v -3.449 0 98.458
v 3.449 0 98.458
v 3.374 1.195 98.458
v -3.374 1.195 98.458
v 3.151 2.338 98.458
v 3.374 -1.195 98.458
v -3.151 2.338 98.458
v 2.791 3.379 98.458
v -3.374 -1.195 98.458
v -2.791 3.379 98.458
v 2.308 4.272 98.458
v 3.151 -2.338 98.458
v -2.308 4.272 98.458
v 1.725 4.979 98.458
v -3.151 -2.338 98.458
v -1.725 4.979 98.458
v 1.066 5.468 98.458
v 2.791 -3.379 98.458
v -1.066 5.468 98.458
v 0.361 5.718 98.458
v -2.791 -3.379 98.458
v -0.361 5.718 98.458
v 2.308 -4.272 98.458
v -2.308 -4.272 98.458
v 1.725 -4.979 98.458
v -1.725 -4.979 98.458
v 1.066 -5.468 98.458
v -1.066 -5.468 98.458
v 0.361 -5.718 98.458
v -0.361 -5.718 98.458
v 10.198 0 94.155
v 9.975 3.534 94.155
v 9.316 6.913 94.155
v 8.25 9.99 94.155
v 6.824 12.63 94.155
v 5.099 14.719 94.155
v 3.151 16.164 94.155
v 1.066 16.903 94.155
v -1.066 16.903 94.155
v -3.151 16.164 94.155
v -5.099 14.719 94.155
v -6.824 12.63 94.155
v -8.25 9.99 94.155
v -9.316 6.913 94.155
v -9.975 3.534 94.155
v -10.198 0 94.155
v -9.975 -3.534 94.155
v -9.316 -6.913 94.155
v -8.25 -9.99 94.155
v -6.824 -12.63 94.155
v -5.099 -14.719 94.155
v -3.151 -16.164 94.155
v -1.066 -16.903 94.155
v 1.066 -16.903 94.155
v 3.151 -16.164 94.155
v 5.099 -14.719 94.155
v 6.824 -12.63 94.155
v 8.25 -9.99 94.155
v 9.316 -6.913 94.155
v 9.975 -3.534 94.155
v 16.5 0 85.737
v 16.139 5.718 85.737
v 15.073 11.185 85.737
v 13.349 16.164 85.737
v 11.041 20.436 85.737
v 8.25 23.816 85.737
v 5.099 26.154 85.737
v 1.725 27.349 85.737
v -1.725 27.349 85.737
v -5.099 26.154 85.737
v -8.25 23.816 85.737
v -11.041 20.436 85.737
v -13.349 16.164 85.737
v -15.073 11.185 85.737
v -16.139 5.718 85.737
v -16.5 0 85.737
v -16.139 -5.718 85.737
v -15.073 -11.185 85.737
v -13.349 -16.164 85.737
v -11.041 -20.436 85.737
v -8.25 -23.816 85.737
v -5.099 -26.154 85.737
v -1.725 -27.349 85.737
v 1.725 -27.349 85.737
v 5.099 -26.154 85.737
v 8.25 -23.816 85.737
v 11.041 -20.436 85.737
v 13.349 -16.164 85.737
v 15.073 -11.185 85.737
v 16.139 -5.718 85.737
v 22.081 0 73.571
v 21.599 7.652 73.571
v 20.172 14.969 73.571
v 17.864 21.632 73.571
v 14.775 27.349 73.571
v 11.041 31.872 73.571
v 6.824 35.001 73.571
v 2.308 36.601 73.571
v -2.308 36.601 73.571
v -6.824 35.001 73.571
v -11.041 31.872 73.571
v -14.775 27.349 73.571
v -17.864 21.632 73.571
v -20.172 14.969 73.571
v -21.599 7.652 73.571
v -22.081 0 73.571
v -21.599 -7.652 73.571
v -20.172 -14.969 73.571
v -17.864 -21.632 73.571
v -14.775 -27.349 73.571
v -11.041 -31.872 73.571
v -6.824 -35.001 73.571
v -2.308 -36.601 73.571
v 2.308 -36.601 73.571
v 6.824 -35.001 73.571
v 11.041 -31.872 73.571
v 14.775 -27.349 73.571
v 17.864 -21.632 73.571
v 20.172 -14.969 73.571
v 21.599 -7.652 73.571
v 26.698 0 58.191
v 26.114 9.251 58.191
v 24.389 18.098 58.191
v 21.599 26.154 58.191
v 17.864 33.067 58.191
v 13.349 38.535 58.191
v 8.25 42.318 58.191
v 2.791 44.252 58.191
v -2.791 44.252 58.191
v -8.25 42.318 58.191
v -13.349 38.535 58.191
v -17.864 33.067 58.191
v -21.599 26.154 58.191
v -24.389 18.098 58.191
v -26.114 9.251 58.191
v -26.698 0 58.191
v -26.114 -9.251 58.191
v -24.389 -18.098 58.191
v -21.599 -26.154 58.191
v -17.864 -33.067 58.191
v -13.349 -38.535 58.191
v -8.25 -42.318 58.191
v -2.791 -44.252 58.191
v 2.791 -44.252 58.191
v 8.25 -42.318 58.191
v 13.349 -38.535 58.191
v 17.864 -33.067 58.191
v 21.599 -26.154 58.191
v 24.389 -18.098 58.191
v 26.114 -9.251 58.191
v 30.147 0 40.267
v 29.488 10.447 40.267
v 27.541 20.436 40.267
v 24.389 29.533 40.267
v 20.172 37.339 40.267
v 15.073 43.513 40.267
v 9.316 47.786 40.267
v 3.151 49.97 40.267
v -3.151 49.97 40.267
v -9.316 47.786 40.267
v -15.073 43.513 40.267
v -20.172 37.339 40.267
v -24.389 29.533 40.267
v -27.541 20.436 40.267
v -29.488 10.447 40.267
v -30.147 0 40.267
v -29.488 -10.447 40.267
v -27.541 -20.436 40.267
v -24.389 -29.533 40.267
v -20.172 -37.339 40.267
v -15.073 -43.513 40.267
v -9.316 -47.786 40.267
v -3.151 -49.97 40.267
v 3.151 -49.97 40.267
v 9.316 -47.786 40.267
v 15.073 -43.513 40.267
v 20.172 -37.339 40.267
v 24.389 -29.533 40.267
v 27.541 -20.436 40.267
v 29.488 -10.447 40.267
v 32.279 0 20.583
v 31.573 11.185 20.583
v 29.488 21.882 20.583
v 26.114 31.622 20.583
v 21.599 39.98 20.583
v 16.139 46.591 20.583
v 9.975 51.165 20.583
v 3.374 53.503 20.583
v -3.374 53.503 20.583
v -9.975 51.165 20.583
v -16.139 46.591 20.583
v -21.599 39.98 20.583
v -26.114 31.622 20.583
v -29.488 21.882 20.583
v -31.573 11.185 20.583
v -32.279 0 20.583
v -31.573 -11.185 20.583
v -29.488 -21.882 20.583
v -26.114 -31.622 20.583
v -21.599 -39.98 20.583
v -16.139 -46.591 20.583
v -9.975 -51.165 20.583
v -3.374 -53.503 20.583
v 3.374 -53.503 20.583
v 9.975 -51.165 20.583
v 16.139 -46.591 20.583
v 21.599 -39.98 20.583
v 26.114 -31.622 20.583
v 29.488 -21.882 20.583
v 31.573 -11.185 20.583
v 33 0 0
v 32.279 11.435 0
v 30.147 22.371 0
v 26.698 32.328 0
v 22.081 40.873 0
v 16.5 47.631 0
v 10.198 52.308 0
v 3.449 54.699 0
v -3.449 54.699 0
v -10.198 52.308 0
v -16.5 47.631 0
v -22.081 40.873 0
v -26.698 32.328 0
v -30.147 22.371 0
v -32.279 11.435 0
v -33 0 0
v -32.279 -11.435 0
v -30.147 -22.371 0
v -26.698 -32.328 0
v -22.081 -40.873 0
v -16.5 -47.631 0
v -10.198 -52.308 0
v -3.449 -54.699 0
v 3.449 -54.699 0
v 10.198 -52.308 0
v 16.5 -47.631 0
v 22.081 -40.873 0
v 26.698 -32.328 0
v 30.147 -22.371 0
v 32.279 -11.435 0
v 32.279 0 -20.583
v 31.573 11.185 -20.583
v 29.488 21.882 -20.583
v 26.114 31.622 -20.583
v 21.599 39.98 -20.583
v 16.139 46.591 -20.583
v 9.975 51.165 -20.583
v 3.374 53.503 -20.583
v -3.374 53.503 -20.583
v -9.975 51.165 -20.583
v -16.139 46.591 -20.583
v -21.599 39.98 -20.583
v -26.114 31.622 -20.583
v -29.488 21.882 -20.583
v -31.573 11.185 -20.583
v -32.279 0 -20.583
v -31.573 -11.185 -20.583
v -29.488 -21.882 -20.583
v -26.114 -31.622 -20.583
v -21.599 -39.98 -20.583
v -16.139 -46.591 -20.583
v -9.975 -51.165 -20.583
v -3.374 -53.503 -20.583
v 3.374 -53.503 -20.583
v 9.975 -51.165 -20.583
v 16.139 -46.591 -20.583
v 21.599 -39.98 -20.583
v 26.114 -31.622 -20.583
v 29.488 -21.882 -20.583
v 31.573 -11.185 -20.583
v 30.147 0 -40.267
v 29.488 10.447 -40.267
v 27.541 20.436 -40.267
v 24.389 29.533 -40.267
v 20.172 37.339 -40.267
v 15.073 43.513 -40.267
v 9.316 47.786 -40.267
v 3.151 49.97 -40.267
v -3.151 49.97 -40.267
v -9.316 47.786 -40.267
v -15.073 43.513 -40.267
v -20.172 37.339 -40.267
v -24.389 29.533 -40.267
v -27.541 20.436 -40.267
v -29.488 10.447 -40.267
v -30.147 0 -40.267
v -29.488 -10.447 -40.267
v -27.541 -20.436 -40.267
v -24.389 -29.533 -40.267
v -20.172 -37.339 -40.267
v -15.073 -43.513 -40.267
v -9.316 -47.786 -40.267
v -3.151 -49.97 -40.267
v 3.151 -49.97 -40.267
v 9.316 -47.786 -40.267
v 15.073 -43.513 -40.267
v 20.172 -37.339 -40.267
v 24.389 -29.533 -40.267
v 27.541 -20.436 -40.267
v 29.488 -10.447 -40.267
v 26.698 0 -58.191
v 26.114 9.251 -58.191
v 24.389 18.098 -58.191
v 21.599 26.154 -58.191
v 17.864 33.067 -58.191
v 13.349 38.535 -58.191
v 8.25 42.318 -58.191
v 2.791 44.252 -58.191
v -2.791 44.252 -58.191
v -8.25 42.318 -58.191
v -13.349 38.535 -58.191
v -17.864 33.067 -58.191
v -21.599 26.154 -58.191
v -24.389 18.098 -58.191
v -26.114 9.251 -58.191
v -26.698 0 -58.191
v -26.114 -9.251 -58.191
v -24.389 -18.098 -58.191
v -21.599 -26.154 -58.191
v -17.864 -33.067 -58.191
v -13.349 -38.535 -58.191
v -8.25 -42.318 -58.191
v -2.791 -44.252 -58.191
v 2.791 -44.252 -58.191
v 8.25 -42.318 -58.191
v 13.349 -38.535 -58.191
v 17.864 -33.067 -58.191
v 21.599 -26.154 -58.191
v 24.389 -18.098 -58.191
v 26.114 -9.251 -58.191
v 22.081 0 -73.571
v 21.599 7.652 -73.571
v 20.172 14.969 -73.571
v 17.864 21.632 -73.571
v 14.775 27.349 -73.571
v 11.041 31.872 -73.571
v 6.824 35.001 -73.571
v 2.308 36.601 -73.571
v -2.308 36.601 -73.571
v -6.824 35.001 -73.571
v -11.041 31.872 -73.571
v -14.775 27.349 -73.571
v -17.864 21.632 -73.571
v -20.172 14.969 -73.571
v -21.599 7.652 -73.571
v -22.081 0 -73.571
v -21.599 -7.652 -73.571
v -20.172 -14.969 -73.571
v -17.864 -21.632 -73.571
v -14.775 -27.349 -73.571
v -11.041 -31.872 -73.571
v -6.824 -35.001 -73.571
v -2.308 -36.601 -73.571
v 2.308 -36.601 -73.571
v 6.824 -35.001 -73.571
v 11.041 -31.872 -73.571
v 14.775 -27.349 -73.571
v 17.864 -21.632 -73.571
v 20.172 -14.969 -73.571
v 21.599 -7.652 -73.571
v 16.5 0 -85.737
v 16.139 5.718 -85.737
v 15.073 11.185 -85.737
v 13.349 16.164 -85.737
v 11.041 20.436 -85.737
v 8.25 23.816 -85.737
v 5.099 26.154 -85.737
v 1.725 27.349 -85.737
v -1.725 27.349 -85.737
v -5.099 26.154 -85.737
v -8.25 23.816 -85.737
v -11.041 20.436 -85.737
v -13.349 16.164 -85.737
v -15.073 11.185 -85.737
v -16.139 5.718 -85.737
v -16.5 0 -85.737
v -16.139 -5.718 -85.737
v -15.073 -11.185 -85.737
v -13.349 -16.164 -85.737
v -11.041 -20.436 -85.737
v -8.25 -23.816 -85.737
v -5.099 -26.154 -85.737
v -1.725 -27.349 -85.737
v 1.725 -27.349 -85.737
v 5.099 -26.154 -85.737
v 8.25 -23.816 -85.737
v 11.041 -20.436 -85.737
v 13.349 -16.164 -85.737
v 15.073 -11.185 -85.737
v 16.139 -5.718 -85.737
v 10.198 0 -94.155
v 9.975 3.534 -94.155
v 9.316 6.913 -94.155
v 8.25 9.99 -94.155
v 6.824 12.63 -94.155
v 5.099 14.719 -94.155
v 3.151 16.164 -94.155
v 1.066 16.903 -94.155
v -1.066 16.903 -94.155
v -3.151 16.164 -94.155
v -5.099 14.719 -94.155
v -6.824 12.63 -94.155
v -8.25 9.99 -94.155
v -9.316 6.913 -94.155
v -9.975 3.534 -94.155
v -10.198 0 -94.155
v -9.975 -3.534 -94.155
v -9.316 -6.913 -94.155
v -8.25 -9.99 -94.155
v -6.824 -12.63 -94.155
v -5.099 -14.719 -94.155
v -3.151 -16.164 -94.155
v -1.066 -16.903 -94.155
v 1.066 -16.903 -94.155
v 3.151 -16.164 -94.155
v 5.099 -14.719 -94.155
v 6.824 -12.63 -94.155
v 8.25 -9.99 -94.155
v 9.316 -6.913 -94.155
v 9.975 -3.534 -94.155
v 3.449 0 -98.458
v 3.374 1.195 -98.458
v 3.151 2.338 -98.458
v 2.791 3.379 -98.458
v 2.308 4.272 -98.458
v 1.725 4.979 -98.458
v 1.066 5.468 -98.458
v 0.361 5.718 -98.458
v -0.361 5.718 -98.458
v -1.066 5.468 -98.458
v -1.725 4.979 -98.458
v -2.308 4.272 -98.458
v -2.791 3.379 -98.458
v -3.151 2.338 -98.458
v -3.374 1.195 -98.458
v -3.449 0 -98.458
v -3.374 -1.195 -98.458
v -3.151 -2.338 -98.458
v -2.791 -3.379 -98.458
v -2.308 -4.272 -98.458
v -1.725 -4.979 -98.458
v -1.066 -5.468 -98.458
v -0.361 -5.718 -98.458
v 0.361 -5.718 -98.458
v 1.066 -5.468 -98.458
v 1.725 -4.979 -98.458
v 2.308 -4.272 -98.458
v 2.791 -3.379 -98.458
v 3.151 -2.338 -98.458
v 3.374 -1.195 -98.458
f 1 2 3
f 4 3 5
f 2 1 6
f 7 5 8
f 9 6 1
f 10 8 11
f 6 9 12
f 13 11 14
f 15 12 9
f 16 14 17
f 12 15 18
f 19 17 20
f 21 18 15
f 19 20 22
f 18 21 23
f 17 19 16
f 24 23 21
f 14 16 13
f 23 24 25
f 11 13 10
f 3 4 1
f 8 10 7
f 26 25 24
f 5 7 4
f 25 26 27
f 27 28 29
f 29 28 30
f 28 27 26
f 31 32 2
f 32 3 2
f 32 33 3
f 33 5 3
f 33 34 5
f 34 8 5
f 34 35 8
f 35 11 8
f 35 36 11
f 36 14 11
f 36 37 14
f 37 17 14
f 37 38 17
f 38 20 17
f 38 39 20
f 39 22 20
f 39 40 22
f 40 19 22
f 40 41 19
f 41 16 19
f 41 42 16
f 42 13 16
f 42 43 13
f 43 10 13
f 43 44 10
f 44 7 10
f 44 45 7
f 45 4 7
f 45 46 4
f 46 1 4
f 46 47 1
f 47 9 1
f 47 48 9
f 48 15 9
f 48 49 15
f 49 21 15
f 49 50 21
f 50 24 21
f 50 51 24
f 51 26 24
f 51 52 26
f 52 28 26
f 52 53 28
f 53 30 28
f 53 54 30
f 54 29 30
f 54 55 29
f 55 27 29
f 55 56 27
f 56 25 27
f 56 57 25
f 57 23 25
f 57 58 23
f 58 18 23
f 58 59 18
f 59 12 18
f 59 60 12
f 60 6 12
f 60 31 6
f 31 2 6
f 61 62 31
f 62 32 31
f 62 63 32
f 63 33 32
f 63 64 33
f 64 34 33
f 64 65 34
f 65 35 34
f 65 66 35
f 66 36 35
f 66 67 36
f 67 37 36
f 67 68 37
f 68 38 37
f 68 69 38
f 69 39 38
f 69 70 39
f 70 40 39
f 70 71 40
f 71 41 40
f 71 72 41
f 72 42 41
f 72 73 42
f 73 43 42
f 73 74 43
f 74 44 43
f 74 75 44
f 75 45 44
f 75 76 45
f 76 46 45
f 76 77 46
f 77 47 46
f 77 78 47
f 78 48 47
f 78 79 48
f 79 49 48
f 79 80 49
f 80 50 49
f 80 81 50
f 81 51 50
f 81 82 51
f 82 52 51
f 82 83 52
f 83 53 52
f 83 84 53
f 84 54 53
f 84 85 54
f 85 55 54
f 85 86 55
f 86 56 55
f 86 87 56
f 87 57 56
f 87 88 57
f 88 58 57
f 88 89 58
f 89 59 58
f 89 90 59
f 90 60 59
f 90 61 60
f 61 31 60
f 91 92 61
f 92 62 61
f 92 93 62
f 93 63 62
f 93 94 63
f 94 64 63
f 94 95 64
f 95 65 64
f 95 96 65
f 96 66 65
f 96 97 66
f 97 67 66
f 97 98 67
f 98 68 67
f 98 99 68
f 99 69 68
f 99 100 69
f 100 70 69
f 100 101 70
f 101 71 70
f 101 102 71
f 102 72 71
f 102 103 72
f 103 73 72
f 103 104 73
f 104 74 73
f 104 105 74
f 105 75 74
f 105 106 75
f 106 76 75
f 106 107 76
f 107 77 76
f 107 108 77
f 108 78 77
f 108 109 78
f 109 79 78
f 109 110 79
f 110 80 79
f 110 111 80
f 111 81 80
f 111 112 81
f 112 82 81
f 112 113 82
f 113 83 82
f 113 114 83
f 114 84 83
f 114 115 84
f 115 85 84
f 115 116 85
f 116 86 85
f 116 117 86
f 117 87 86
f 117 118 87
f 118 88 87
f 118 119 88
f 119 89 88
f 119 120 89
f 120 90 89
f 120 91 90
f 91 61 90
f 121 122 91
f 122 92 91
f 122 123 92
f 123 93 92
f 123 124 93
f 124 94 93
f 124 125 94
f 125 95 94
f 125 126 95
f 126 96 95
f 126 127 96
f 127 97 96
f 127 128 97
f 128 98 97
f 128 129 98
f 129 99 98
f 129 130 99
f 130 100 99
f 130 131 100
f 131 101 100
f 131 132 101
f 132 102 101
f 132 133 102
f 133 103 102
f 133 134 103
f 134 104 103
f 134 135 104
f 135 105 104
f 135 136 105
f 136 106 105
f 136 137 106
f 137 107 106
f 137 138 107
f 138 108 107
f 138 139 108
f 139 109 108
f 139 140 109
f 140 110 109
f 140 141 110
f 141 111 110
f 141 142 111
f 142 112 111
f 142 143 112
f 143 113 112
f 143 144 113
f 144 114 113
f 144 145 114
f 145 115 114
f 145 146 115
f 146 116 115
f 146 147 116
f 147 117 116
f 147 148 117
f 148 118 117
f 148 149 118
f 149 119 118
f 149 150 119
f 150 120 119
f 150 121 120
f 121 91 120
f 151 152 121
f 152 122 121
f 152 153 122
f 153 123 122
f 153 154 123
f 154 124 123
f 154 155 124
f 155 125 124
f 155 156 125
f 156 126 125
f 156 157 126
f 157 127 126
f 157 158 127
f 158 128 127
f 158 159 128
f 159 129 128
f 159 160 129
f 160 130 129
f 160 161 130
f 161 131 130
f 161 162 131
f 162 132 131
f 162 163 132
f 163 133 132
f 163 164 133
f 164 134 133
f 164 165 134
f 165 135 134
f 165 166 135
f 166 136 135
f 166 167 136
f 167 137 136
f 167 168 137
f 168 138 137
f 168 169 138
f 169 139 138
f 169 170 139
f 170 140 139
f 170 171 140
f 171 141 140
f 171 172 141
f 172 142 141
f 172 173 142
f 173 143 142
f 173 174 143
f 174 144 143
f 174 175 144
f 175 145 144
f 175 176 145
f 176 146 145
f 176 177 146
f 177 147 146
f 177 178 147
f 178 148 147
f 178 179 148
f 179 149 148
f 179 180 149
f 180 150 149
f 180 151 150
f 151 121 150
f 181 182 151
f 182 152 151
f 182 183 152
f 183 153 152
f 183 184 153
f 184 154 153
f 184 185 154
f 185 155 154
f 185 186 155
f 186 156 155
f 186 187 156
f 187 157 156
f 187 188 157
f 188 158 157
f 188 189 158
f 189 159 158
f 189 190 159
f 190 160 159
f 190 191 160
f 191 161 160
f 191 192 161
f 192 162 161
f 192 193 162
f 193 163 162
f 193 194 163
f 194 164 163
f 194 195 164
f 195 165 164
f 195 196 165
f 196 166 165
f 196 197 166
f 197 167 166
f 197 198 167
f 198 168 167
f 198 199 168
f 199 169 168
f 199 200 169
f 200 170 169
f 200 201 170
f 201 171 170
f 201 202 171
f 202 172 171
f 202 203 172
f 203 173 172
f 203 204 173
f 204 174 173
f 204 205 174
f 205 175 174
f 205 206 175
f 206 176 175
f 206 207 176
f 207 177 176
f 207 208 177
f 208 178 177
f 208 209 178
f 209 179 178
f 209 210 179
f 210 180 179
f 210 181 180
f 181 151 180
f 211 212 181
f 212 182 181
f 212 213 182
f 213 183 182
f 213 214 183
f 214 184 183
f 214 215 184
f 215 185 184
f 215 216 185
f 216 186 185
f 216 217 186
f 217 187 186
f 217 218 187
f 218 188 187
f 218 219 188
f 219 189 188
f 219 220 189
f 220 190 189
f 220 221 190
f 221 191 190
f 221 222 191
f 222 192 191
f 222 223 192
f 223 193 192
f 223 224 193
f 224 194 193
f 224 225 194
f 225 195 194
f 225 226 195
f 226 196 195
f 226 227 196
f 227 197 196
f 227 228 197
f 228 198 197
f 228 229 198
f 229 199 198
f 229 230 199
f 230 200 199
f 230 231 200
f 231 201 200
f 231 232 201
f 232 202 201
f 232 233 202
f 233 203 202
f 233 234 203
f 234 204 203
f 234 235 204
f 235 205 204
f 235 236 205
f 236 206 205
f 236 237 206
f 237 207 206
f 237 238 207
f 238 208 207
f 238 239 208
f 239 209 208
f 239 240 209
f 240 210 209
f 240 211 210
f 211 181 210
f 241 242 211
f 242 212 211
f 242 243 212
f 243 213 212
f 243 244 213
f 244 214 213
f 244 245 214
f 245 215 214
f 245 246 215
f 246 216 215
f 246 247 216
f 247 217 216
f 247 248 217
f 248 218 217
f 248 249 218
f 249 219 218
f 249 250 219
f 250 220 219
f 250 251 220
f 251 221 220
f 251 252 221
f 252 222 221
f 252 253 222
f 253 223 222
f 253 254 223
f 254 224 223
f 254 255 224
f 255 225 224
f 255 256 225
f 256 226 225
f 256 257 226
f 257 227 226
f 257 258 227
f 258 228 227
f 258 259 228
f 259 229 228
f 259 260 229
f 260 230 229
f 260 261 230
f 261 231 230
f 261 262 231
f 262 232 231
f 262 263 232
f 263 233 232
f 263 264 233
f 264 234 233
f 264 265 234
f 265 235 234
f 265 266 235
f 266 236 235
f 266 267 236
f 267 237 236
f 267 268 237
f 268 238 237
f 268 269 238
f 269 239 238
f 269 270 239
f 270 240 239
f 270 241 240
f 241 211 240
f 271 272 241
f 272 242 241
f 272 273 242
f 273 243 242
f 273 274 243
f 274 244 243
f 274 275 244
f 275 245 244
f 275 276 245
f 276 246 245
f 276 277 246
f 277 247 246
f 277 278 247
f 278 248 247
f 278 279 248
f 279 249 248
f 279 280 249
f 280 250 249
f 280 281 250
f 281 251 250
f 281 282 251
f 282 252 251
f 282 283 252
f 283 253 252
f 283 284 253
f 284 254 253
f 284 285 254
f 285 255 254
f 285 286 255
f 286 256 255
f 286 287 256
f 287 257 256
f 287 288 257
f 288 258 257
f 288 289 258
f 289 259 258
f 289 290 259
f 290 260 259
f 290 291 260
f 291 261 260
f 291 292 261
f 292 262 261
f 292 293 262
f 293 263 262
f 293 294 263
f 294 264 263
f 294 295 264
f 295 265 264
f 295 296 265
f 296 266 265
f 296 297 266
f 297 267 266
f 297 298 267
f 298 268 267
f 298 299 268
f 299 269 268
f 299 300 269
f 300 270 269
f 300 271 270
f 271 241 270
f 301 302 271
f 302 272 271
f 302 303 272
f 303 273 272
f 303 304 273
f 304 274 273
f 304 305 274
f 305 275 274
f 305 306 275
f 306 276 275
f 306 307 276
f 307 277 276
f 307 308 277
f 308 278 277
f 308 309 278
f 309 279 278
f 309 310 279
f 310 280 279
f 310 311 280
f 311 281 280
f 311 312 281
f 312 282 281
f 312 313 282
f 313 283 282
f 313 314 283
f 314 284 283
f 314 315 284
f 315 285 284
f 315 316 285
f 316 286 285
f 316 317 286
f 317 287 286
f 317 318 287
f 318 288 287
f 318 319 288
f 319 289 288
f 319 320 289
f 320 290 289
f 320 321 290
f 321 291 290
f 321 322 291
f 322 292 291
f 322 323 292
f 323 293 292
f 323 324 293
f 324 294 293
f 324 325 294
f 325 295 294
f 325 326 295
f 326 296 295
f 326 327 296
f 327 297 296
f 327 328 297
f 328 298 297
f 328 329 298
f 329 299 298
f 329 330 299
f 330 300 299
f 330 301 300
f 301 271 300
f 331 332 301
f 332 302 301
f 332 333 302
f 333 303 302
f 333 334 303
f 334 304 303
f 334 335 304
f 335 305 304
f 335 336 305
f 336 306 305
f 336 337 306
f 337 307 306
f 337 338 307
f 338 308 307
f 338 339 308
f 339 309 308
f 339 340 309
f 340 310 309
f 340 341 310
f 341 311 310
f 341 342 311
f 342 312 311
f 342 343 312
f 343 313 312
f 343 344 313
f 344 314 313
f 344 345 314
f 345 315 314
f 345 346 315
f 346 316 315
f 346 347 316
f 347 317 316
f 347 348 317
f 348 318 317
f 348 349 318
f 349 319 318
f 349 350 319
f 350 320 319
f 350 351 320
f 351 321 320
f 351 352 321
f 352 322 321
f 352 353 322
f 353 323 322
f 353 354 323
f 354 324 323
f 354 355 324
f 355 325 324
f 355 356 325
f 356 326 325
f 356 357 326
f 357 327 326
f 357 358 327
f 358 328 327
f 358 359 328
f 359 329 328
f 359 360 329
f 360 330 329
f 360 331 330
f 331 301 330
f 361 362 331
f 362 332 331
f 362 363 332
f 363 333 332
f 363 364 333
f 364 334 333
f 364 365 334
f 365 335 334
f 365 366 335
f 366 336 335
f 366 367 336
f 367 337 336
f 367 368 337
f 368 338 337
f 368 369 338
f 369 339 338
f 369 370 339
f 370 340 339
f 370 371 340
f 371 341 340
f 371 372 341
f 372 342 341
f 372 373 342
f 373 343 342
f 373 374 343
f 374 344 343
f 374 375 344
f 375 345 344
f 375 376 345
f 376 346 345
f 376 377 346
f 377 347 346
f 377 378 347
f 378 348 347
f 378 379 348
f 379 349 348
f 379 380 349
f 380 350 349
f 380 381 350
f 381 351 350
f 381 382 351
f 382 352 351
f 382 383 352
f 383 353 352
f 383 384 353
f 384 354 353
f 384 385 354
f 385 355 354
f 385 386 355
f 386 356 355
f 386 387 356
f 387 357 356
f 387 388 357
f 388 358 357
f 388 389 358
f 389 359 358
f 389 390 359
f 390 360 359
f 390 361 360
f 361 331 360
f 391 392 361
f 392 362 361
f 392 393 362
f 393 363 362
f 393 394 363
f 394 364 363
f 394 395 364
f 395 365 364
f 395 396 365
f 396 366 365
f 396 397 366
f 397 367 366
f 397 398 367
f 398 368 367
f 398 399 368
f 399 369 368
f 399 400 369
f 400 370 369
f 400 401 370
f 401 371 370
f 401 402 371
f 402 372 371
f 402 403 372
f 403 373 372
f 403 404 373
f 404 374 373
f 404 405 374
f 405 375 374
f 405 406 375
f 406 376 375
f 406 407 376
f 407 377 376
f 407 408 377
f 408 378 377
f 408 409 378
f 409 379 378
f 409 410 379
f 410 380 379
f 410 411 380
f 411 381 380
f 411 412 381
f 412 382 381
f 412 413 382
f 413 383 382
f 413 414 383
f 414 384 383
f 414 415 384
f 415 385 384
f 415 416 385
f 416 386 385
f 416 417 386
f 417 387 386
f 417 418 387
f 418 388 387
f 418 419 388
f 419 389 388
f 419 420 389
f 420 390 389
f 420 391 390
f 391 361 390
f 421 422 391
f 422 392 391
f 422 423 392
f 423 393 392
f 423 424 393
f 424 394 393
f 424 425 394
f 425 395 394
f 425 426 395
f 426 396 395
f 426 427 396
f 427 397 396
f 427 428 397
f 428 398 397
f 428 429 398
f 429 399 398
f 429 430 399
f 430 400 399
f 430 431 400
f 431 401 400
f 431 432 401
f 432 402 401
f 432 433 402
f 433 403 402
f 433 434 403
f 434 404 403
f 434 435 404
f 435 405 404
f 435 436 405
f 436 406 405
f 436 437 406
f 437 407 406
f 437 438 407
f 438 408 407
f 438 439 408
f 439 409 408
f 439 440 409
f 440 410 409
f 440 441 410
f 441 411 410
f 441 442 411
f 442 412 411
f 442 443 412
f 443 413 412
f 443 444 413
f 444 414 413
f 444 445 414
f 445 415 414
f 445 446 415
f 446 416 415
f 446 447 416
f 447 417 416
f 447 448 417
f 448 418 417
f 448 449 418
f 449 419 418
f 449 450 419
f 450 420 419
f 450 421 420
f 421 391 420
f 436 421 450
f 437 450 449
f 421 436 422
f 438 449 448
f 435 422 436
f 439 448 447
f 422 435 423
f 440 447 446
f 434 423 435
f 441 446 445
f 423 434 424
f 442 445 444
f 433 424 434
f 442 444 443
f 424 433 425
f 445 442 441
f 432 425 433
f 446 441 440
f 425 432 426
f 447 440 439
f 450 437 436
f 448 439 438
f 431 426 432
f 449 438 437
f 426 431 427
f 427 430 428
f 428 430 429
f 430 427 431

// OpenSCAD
// Generated by SolidPython 1.0.1 on 2020-07-29 00:39:25


scale(v = [3, 5, 9]) {
	sphere(r = 11);
}
/***********************************************
*********      SolidPython code:      **********
************************************************
 
# import packages: SolidPython
from solid import *
from solid.utils import *
from itertools import chain, combinations


class Resize:

    def __init__(self, scad_file):
        self.scad_file = scad_file
        #self.scad_file = import_scad(scad_file)
        # cone/cylinder param:
        self.r1 = 0
        self.r2 = 0
        self.h = 0
        # rectangular prism param:
        self.w = 0
        self.l = 0
        # ellipse param:
        self.r = 0

    # import OpenScad code (file name corresponds to shape)


    # classify shape + parameters
    def assign(self, param1, param2, param3):
        if self.scad_file == 'cone.scad':
            self.r1 = param1
            self.r2 = param2
            self.h = param3
        elif self.scad_file == 'cylinder.scad':
            self.r1 = param1
            self.r2 = param2
            self.h = param3
        elif self.scad_file == 'rectangularPrism.scad':
            self.h = param1
            self.l = param2
            self.w = param3
        else:
            self.r = param1
            self.h = param2

    # resize parameters
    def iterate(self):
        x = range(3, 20, 2)
        i = 1
        if self.scad_file == 'cone.scad':
            tempList = list(combinations(x, 2))
            for temp in tempList:
                param1 = temp[0]
                param2 = temp[1]
                filepath = 'produced_scad_files/' + 'cone' + str(param1) + '_' + str(param2) + '_' + '.scad'
                scad_render_to_file(cylinder(h=param1, r1=param2, r2=0), filepath)

        elif self.scad_file == 'cylinder.scad':
            tempList = list(combinations(x, 3))
            for temp in tempList:
                param1 = temp[0]
                param2 = temp[1]
                filepath = 'produced_scad_files/' + 'cylinder' + str(param1) + '_' + str(param2) + '_' + '.scad'
                scad_render_to_file(cylinder(h=param1, r1=param2, r2=param2), filepath)

        elif self.scad_file == 'rectangularPrism.scad':
            tempList = list(combinations(x, 3))
            for temp in tempList:
                param1 = temp[0]
                param2 = temp[1]
                param3 = temp[2]
                filepath = 'produced_scad_files/' + 'rectangularPrism' + str(param1) + '_' + str(param2) + '_' + str(
                    param3) + '.scad'
                scad_render_to_file(cube(size=(param1, param2, param3)), filepath)

        elif self.scad_file == 'ellipse.scad':
            tempList = list(combinations(x, 4))
            for temp in tempList:
                param1 = temp[0]
                param2 = temp[1]
                param3 = temp[2]
                param4 = temp[3]
                filepath = 'produced_scad_files/' + 'ellipse' + str(param1) + '_' + str(param2) + '_' + str(param3) + '_' + str(param4) + '.scad'
                scad_render_to_file(scale([param1, param2, param3])(sphere(r=param4)), filepath)

    def render_to_scadfile(self):
        scad_render_to_file(scad, 'example.scad') 
 
************************************************/
